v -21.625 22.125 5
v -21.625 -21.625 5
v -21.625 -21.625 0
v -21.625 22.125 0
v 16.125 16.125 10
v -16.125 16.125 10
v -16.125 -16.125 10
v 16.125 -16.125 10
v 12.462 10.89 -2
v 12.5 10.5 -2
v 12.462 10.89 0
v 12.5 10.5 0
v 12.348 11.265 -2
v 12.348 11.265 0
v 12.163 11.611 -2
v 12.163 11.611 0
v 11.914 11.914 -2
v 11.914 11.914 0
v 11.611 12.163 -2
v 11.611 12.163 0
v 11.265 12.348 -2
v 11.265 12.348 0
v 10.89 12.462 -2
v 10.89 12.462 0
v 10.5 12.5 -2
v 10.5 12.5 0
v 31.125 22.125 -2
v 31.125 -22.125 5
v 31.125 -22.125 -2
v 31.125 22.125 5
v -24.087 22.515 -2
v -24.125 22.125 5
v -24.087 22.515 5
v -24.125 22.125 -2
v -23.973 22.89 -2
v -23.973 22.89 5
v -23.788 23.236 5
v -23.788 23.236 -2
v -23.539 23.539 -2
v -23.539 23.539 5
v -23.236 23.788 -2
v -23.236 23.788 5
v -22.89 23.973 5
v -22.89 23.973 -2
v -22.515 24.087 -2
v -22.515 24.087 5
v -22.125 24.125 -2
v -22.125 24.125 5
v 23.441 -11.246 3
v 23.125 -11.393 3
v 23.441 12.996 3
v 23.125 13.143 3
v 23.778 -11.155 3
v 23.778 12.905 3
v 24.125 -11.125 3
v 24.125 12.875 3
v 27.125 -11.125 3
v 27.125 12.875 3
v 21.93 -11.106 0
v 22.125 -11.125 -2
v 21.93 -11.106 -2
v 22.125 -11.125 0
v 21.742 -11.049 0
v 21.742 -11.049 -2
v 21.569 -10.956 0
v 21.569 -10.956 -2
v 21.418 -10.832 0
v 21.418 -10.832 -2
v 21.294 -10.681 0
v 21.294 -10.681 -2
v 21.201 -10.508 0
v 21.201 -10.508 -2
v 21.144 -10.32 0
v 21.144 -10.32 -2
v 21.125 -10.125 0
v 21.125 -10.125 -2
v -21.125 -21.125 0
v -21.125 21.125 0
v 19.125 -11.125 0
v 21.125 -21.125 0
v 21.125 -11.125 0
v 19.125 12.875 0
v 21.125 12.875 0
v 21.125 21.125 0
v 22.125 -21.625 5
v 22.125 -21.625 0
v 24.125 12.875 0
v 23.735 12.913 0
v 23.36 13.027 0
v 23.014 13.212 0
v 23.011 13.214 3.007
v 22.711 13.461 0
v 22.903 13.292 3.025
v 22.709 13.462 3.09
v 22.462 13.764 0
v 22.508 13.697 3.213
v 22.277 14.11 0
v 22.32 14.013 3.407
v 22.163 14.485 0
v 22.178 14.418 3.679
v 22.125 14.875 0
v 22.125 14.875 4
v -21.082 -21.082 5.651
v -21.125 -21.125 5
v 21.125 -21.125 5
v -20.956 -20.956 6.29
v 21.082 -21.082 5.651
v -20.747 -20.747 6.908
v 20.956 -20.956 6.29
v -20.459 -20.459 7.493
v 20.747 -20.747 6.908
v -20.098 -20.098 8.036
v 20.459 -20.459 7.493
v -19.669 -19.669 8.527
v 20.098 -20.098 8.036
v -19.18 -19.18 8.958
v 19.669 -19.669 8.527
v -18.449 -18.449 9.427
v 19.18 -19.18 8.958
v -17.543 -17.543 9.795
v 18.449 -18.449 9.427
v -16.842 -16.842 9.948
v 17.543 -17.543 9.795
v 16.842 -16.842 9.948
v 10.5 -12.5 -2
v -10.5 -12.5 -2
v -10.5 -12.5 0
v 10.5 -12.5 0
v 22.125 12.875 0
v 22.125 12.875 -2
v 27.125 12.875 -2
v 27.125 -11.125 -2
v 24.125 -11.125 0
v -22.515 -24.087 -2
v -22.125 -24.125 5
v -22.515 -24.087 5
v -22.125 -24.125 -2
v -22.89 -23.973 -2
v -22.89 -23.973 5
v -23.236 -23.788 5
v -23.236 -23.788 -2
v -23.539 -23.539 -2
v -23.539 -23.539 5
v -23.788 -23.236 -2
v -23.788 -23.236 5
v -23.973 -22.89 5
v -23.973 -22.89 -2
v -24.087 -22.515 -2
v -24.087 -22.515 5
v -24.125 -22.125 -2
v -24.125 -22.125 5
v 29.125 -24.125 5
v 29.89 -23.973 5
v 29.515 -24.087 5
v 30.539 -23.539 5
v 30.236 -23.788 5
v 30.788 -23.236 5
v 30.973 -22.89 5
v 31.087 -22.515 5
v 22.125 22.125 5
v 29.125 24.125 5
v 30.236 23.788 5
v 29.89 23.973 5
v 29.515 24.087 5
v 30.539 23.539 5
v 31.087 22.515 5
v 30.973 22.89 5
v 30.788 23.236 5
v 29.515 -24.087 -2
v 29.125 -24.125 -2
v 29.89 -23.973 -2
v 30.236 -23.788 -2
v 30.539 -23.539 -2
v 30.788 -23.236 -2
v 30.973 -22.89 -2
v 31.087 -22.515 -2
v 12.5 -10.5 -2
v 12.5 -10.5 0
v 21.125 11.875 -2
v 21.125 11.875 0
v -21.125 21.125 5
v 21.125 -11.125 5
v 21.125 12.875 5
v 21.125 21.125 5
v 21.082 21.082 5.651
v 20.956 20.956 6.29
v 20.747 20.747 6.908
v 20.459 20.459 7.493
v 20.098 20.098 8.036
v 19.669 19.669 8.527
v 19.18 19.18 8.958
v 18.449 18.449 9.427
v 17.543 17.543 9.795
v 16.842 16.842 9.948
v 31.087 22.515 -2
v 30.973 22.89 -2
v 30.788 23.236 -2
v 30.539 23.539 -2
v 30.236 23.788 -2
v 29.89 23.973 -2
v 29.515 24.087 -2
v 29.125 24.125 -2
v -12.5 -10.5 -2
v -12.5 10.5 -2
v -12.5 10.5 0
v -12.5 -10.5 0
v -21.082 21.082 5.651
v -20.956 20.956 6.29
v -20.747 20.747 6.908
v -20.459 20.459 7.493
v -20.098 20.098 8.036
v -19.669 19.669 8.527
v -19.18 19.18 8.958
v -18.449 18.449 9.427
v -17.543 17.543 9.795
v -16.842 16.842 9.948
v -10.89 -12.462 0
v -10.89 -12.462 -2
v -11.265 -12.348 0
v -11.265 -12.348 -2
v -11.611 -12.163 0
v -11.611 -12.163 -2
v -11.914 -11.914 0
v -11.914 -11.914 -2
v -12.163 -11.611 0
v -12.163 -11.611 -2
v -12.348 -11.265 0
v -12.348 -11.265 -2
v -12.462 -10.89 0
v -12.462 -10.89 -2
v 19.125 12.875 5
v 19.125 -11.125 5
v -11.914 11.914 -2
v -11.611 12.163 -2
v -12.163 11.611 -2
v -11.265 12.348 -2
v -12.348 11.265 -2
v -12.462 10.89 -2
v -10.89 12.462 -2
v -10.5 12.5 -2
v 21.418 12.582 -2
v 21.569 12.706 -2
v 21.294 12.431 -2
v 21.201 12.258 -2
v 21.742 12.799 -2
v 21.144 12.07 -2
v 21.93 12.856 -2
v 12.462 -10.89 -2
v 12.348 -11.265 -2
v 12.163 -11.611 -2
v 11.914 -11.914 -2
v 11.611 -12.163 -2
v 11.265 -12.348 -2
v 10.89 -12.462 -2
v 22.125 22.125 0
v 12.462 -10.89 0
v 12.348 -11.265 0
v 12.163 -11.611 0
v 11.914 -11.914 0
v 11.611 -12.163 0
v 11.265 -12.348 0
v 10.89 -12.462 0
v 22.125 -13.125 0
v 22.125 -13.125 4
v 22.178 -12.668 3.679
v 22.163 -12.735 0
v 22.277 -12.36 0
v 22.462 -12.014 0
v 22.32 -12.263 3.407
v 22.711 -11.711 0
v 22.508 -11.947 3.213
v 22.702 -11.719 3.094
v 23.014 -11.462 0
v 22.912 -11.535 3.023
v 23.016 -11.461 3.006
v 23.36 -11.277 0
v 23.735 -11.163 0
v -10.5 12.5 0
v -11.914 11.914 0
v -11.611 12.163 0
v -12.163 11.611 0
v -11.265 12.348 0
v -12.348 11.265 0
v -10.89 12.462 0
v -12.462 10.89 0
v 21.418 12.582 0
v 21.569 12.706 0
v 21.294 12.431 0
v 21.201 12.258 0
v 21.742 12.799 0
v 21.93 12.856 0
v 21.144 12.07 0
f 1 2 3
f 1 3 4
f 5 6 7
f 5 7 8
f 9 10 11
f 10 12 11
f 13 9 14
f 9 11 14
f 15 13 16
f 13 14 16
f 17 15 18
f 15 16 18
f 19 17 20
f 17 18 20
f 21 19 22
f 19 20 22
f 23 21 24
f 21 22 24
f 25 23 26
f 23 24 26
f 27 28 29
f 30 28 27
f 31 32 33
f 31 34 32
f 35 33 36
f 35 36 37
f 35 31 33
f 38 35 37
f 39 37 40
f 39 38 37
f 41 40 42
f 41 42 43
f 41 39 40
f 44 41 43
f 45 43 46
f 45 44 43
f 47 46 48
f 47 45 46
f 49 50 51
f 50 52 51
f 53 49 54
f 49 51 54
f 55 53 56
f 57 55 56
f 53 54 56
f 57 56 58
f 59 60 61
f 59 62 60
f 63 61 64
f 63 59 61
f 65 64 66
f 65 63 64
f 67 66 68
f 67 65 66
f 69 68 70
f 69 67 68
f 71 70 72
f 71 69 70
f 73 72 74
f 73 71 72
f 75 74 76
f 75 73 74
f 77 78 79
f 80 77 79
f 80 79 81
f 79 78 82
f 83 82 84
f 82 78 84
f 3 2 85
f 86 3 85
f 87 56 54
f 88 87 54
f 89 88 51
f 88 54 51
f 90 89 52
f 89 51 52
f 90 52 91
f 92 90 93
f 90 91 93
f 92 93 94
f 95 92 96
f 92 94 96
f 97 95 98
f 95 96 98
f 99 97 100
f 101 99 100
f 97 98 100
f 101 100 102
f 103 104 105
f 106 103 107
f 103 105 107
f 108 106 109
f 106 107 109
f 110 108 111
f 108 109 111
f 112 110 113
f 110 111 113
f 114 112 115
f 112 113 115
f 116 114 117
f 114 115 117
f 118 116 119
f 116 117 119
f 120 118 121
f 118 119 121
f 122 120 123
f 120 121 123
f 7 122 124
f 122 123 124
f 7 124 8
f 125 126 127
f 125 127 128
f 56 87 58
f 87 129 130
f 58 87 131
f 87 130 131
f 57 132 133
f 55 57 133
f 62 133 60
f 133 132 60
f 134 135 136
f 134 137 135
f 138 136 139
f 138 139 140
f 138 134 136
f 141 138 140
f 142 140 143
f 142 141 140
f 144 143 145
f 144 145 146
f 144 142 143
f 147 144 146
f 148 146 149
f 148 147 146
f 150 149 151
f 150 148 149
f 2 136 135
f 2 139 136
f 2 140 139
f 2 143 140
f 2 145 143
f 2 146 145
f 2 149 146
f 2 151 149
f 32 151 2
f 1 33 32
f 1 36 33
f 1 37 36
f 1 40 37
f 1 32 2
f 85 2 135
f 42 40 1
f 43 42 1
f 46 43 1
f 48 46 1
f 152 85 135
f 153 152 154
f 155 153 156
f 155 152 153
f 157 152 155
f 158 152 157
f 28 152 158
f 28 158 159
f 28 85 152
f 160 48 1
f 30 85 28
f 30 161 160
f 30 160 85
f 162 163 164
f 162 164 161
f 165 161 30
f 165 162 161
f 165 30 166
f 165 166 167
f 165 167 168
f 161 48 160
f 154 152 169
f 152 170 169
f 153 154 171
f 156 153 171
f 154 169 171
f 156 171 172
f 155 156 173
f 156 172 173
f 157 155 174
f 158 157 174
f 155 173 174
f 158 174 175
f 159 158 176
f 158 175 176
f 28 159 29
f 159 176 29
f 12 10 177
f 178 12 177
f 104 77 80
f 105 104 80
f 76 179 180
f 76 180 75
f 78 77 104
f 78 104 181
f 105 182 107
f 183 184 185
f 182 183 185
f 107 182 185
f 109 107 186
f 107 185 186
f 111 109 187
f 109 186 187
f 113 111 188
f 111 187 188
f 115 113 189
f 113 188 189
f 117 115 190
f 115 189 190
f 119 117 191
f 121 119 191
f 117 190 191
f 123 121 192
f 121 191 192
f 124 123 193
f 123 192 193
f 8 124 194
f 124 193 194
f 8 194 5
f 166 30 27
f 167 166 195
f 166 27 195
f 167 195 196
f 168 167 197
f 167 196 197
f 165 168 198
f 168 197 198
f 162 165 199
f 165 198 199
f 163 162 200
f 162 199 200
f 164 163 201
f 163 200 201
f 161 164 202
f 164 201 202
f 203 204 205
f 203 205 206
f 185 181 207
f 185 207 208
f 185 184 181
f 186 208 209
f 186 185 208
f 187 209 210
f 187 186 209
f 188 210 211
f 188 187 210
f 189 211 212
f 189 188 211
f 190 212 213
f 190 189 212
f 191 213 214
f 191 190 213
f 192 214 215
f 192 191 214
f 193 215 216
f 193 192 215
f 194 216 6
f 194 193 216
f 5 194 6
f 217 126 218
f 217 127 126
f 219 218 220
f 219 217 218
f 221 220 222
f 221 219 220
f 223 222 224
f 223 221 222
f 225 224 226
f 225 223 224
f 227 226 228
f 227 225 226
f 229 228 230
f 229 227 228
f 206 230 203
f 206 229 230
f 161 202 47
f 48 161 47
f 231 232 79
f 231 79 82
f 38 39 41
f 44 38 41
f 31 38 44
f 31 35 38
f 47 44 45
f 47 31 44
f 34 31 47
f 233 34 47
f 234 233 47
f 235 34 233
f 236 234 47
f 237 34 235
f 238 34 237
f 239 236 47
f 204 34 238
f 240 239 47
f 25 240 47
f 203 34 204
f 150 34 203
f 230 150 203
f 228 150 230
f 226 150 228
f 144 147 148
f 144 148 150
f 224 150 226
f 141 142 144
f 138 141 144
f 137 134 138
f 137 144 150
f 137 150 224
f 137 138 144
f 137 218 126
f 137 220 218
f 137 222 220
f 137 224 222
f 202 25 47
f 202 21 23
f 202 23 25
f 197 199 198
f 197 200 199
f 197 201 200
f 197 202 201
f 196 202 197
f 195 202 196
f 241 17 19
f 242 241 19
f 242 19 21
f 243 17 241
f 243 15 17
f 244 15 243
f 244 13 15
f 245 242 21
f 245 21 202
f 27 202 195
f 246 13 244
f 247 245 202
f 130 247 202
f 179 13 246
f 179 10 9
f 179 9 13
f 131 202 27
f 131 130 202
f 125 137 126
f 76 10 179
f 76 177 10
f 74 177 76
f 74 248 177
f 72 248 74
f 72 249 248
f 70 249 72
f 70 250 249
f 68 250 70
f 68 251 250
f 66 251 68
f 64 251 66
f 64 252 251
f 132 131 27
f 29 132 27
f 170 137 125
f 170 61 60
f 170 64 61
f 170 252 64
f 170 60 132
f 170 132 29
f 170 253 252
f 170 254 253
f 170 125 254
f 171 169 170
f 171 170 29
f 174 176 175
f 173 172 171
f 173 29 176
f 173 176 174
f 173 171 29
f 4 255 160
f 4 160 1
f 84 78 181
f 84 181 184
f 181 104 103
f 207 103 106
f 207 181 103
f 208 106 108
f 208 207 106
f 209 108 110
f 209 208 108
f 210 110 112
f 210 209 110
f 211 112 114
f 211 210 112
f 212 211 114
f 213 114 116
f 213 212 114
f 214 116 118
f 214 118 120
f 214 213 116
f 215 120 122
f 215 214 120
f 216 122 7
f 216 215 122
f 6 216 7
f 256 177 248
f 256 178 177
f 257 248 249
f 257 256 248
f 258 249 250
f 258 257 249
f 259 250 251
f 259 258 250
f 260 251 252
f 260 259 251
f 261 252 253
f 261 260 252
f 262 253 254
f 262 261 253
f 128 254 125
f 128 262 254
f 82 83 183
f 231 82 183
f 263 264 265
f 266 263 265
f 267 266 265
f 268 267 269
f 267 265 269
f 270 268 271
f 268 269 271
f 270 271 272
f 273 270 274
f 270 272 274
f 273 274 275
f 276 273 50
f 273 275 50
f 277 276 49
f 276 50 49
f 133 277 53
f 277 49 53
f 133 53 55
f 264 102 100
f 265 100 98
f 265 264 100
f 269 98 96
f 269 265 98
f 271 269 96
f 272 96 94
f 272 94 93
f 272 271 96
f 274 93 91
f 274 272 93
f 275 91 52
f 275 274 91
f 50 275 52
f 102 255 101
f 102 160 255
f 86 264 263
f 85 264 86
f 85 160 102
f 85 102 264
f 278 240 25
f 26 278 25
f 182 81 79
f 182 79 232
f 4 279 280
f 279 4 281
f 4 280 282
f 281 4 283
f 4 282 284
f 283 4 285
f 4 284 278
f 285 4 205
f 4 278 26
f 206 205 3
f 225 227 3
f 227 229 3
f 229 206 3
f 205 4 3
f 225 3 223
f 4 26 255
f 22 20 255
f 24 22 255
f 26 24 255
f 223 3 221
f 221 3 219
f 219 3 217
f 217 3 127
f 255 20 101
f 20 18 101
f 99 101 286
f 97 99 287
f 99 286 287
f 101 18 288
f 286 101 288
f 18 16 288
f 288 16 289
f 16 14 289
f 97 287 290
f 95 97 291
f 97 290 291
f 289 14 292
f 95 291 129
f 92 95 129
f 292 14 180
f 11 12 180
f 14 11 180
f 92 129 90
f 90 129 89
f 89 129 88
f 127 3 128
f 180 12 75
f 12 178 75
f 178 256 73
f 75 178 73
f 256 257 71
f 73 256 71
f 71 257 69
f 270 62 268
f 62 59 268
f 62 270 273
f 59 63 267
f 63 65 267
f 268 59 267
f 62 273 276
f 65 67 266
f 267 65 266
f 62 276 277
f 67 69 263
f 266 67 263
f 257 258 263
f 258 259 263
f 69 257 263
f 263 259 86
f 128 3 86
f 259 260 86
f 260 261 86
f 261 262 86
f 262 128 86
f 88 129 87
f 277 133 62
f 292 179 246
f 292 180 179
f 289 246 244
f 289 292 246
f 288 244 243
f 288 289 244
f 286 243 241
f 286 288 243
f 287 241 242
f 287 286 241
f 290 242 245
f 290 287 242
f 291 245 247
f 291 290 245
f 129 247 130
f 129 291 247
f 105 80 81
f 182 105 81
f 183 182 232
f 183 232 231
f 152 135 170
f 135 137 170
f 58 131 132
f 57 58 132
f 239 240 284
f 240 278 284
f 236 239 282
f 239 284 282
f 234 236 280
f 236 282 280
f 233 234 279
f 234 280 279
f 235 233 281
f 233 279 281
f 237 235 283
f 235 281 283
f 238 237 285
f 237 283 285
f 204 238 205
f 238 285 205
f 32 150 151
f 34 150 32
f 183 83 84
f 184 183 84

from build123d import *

# Parameters (mm, degrees)
F0_W      = 42.25
F0_H      = 42.25
F1_DEPTH  = 10
F2_R      = 5
F3_W      = 24
F3_H      = 5
F4_DEPTH  = 2
F6_W      = 48.25
F6_H      = 48.25
F7_DEPTH  = 2
F8_DEPTH  = 5
F9_W      = 3
F9_H      = 24
F10_DEPTH = 25
F11_W     = 4.5
F11_H     = 10
F11_H_2   = 28.25
F11_W_2   = 9
F11_H_3   = 4.75
F11_H_4   = 3
F12_DEPTH = 4
F16_DEPTH = 2
F20_W     = 25
F20_H     = 25
F21_DEPTH = 2
F23_DEPTH = 7
F24_W     = 11
F24_H     = 48.25
F25_DEPTH = 25
F26_R     = 2
F28_DEPTH = 2
F29_R     = 1
F30_R     = 1
F31_W     = 0.5
F31_H     = 43.75
F31_W_2   = 43.75
F31_H_2   = 0.5
F32_DEPTH = 5


with BuildPart() as f1:
    # F0 (on Top) → F1 (new body)
    with BuildSketch(Plane.XY):
        Rectangle(F0_W, F0_H)
    extrude(amount=F1_DEPTH)

    # F2
    f2_edges = [f1.edges().sort_by_distance(p)[0] for p in [
        (-21.125, 0, 10),
        (0, -21.125, 10),
        (21.125, 0, 10),
        (0, 21.125, 10),
    ]]
    fillet(f2_edges, radius=F2_R)

    # F3 (on face) → F4 (cut)
    with BuildSketch(Plane.YZ.offset(21.125)):
        with Locations((0.875, 2.5)):
            Rectangle(F3_W, F3_H)
    extrude(amount=-F4_DEPTH, mode=Mode.SUBTRACT)


with BuildPart() as f7:
    # F6 (on face) → F7 (new body)
    with BuildSketch(Plane(origin=(0, 0, 0), x_dir=(1, 0, 0), z_dir=(0, 0, -1))):
        Rectangle(F6_W, F6_H)
    extrude(amount=F7_DEPTH)

    # F5 (on face) → F8 (join)
    with BuildSketch(Plane(origin=(0, 0, 0), x_dir=(1, 0, 0), z_dir=(0, 0, -1))):
        Polygon((22.125, -12.875), (22.125, -22.125), (-22.125, -22.125), (-22.125, 22.125), (22.125, 22.125), (22.125, 11.125), (24.125, 11.125), (24.125, 24.125), (-24.125, 24.125), (-24.125, -24.125), (24.125, -24.125), (24.125, -12.875), align=None)
    extrude(amount=-F8_DEPTH)

    # F9 (on face) → F10 (cut)
    with BuildSketch(Plane(origin=(0, 0, -2), x_dir=(1, 0, 0), z_dir=(0, 0, -1))):
        with Locations((22.625, -0.875)):
            Rectangle(F9_W, F9_H)
    extrude(amount=-F10_DEPTH, mode=Mode.SUBTRACT)

    # F11 (on face) → F12 (join)
    with BuildSketch(Plane(origin=(0, 0, -2), x_dir=(1, 0, 0), z_dir=(0, 0, -1))):
        Polygon((24.125, 24.125), (24.125, 17.125), (33.125, 17.125), (33.125, 14.125), (37.625, 14.125), (37.625, 24.125), align=None)
        with Locations((39.875, 19.125)):
            Rectangle(F11_W, F11_H)
        with Locations((35.375, 0)):
            Rectangle(F11_W, F11_H_2)
        with Locations((39.875, 0)):
            Rectangle(F11_W, F11_H_2)
        Polygon((37.625, -14.125), (33.125, -14.125), (33.125, -18.875), (24.125, -18.875), (24.125, -24.125), (37.625, -24.125), align=None)
        with Locations((39.875, -19.125)):
            Rectangle(F11_W, F11_H)
        Polygon((24.125, 14.125), (24.125, 11.125), (27.125, 11.125), (27.125, -12.875), (24.125, -12.875), (24.125, -14.125), (33.125, -14.125), (33.125, 14.125), align=None)
        with Locations((28.625, -16.5)):
            Rectangle(F11_W_2, F11_H_3)
        with Locations((28.625, 15.625)):
            Rectangle(F11_W_2, F11_H_4)
    extrude(amount=-F12_DEPTH)

    # F15 (on offset) → F16 (join)
    with BuildSketch(Plane.XY.offset(3)):
        Polygon((24.125, -24.125), (42.125, -24.125), (42.125, 24.125), (24.125, 24.125), (24.125, 12.875), (27.125, 12.875), (27.125, -11.125), (24.125, -11.125), align=None)
    extrude(amount=F16_DEPTH)

    # F20 (on face) → F21 (cut, through all)
    with BuildSketch(Plane(origin=(0, 0, -2), x_dir=(1, 0, 0), z_dir=(0, 0, -1))):
        Rectangle(F20_W, F20_H)
    extrude(amount=-F21_DEPTH, mode=Mode.SUBTRACT)

    # F22 (on face) → F23 (join, through all)
    with BuildSketch(Plane.XY.offset(5)):
        Polygon((22.125, -24.125), (42.125, -24.125), (42.125, 24.125), (22.125, 24.125), (22.125, 22.125), (22.125, 12.875), (27.125, 12.875), (27.125, -11.125), (22.125, -11.125), (22.125, -22.125), align=None)
    extrude(amount=-F23_DEPTH)

    # F24 (on face) → F25 (cut)
    with BuildSketch(Plane.XY.offset(5)):
        with Locations((36.625, 0)):
            Rectangle(F24_W, F24_H)
    extrude(amount=-F25_DEPTH, mode=Mode.SUBTRACT)

    # F26
    f26_edges = [f7.edges().sort_by_distance(p)[0] for p in [
        (31.125, 24.125, 1.5),
        (-24.125, 24.125, 1.5),
        (-24.125, -24.125, 1.5),
        (31.125, -24.125, 1.5),
        (22.125, -11.125, 2.5),
        (22.125, 12.875, 2.5),
        (12.5, 12.5, -1),
        (-12.5, 12.5, -1),
        (-12.5, -12.5, -1),
        (12.5, -12.5, -1),
    ]]
    fillet(f26_edges, radius=F26_R)

    # F27 (on face) → F28 (join)
    with BuildSketch(Plane.XY.offset(5)):
        with BuildLine():
            Line((22.125, 14.875), (22.125, -13.125))
            ThreePointArc((22.125, -13.125), (22.7107864376, -11.7107864376), (24.125, -11.125))
            Line((24.125, -11.125), (27.125, -11.125))
            Line((27.125, -11.125), (27.125, 12.875))
            Line((27.125, 12.875), (24.125, 12.875))
            ThreePointArc((24.125, 12.875), (22.7107864376, 13.4607864376), (22.125, 14.875))
        make_face()
    extrude(amount=-F28_DEPTH)

    # F29
    f29_edges = [f7.edges().sort_by_distance(p)[0] for p in [
        (22.125, 0.875, 3),
    ]]
    fillet(f29_edges, radius=F29_R)

    # F30
    f30_edges = [f7.edges().sort_by_distance(p)[0] for p in [
        (21.125, -11.125, -1),
        (21.125, 12.875, -1),
    ]]
    fillet(f30_edges, radius=F30_R)

    # F31 (on face) → F32 (join, through all)
    with BuildSketch(Plane.XY.offset(5)):
        with Locations((-21.875, 0.25)):
            Rectangle(F31_W, F31_H)
        with Locations((0.25, -21.875)):
            Rectangle(F31_W_2, F31_H_2)
        with Locations((-21.875, -21.875)):
            Rectangle(F31_W, F31_H_2)
    extrude(amount=-F32_DEPTH)


solid = Compound([f1.part, f7.part])
